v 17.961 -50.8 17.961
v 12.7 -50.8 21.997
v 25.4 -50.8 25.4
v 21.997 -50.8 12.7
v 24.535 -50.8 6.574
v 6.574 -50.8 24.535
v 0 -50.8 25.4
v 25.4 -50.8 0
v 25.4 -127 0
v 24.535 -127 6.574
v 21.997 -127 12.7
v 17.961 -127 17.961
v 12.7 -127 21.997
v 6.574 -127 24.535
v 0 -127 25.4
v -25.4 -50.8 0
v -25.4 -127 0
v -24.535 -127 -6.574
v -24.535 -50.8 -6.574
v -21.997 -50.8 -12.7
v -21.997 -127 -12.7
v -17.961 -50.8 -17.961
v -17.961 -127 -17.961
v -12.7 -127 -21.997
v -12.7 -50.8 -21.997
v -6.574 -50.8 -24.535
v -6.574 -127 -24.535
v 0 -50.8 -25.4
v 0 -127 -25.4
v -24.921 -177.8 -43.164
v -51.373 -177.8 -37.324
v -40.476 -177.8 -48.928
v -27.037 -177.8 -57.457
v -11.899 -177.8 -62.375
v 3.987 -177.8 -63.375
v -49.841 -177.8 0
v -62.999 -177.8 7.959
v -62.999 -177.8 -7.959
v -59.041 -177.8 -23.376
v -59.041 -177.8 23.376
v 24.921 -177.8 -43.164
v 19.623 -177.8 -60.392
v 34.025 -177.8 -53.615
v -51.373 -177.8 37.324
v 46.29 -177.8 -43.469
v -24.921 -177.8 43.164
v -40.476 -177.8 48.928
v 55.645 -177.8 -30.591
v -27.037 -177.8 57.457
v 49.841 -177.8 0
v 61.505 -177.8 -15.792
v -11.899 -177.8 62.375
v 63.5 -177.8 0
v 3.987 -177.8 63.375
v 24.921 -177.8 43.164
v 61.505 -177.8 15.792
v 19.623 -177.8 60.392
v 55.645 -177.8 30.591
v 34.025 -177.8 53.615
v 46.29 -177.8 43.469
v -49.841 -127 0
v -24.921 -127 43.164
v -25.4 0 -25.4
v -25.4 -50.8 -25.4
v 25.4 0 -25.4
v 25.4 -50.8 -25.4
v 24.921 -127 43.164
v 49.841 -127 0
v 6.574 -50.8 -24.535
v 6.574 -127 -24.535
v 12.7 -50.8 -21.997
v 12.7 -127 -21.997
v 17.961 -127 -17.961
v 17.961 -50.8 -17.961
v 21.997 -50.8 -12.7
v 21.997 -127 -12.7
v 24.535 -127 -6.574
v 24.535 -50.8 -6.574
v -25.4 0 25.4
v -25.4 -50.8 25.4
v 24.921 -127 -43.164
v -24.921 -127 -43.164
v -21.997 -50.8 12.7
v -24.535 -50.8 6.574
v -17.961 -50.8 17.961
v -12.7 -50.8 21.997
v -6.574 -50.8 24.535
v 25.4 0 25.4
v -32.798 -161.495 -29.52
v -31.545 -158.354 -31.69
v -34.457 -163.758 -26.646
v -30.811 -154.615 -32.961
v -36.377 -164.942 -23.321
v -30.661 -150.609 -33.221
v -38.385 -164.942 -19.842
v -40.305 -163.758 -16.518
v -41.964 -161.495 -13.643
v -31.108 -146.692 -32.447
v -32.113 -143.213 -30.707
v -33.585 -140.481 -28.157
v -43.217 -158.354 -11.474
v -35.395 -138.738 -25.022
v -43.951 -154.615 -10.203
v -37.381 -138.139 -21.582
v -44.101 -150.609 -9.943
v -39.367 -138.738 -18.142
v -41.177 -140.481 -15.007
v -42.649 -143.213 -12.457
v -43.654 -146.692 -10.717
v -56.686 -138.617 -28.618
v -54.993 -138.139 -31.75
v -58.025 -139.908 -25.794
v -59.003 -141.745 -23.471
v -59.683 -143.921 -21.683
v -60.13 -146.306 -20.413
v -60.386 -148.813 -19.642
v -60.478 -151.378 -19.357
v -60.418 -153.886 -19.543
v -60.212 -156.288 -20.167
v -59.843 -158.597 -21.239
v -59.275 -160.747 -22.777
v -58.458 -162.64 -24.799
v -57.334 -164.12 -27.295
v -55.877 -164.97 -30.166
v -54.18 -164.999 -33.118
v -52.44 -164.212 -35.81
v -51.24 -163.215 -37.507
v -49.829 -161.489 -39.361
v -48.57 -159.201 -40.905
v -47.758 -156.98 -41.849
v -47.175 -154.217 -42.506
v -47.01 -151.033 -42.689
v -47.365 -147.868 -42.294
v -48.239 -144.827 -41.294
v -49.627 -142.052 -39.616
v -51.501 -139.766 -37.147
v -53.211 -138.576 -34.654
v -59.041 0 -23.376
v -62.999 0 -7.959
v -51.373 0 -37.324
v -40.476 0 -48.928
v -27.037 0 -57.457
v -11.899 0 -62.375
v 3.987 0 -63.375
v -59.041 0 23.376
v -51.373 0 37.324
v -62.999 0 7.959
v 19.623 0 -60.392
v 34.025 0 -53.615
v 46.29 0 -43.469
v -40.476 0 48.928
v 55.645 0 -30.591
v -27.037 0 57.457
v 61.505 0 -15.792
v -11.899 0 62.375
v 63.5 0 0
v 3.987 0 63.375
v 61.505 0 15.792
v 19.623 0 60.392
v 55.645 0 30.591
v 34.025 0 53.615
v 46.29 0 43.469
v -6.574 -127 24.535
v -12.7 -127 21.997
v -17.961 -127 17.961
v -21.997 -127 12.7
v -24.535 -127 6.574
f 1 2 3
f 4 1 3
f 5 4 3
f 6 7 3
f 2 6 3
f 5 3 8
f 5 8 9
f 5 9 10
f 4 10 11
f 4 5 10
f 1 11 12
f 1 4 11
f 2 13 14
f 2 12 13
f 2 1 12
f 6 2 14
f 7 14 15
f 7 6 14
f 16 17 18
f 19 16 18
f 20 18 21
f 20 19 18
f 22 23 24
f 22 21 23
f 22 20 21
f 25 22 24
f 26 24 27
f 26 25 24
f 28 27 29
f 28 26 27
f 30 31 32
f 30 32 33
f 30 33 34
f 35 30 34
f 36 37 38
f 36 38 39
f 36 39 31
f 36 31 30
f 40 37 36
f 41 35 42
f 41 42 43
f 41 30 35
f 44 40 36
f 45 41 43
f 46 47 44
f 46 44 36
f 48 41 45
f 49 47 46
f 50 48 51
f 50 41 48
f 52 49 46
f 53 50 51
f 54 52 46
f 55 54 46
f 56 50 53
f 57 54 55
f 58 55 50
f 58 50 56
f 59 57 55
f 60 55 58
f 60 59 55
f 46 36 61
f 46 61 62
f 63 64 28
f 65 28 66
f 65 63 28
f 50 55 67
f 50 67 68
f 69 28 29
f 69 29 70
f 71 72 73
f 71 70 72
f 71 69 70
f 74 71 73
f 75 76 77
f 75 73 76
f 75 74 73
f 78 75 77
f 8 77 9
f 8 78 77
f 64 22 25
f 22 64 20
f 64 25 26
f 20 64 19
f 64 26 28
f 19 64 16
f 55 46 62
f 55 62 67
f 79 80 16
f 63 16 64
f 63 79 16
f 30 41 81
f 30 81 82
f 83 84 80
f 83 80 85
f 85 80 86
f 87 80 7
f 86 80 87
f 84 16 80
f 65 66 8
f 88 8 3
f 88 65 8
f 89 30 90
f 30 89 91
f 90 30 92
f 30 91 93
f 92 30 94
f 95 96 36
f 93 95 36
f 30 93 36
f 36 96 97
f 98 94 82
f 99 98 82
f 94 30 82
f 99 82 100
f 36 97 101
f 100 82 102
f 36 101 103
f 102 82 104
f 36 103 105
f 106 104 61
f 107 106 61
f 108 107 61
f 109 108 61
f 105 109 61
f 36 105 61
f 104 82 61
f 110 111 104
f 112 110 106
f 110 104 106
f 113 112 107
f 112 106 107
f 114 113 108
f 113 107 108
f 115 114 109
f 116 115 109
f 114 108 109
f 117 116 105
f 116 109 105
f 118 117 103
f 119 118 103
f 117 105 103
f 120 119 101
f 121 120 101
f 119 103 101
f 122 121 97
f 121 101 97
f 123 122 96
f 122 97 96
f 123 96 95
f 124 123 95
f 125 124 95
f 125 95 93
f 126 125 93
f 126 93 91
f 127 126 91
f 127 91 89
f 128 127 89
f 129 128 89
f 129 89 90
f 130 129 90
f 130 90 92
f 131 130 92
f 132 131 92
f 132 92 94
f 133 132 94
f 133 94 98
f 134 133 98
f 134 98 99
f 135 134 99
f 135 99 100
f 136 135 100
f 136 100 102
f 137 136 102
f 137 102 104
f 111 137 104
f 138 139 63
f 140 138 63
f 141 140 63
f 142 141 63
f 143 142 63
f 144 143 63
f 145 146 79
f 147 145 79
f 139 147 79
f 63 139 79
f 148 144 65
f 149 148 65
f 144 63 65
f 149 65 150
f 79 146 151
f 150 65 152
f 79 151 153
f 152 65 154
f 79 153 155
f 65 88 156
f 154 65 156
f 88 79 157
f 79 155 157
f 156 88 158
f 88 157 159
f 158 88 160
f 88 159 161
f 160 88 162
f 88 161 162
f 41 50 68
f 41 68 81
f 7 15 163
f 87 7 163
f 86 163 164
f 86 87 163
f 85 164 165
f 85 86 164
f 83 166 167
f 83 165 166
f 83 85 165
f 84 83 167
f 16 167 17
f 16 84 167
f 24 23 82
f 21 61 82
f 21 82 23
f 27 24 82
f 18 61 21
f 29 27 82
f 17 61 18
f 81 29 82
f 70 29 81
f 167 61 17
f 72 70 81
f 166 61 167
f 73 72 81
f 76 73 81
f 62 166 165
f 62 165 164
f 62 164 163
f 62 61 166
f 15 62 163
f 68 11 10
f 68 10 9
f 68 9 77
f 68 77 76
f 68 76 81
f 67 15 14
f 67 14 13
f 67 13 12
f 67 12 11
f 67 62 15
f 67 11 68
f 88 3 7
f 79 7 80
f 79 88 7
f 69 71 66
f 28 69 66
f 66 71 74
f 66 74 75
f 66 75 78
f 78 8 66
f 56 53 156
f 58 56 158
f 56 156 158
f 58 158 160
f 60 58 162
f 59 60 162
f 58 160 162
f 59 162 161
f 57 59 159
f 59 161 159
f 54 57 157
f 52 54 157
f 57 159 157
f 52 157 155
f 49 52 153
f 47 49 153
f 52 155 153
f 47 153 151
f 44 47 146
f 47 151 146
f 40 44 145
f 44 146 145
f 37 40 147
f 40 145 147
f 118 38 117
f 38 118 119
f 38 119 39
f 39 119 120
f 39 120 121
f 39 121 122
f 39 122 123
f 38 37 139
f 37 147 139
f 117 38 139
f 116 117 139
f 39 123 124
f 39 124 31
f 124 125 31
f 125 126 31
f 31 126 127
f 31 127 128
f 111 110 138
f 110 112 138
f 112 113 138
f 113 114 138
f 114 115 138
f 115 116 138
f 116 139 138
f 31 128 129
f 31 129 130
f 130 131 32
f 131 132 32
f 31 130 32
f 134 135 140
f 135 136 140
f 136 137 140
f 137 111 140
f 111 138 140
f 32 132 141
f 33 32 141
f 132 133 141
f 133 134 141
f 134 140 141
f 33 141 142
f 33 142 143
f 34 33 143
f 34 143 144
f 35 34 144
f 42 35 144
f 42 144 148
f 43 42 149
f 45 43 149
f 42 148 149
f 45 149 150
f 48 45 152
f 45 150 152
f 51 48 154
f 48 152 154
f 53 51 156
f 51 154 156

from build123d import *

# Parameters (mm, degrees)
F0_R     = 63.5
F1_DEPTH = 127
F3_DEPTH = 127.001
F4_DEPTH = 50.8
F5_R     = 63.5
F6_DEPTH = 50.8
F7_R     = 13.4769297295
F8_DEPTH = 43.5797324345


with BuildPart() as f1:
    # F0 (on Front) → F1 (new body)
    with BuildSketch(Plane.XZ):
        Circle(F0_R)
    extrude(amount=F1_DEPTH)

    # F2 (on Front) → F3 (cut, through all)
    with BuildSketch(Plane.XZ):
        with BuildLine():
            ThreePointArc((25.4, 0), (17.9605122594, 17.9605122249), (4.89e-08, 25.4))
            ThreePointArc((4.89e-08, 25.4), (-17.9605122127, 17.9605122716), (-25.4, 3.44e-08))
            ThreePointArc((-25.4, 3.44e-08), (-17.9605122437, -17.9605122406), (3.01e-08, -25.4))
            ThreePointArc((3.01e-08, -25.4), (17.9605122528, -17.9605122315), (25.4, 0))
        make_face()
    extrude(amount=F3_DEPTH, mode=Mode.SUBTRACT)

    # F2 (on Front) → F4 (cut)
    with BuildSketch(Plane.XZ):
        with BuildLine():
            Line((4.89e-08, 25.4), (-25.4, 25.4))
            Line((-25.4, 25.4), (-25.4, 3.44e-08))
            ThreePointArc((-25.4, 3.44e-08), (-17.9605122127, 17.9605122716), (4.89e-08, 25.4))
        make_face()
        with BuildLine():
            Line((25.4, 25.4), (4.89e-08, 25.4))
            ThreePointArc((4.89e-08, 25.4), (17.9605122594, 17.9605122249), (25.4, 0))
            Line((25.4, 0), (25.4, 25.4))
        make_face()
        with BuildLine():
            ThreePointArc((25.4, 0), (17.9605122594, 17.9605122249), (4.89e-08, 25.4))
            ThreePointArc((4.89e-08, 25.4), (-17.9605122127, 17.9605122716), (-25.4, 3.44e-08))
            ThreePointArc((-25.4, 3.44e-08), (-17.9605122437, -17.9605122406), (3.01e-08, -25.4))
            ThreePointArc((3.01e-08, -25.4), (17.9605122528, -17.9605122315), (25.4, 0))
        make_face()
        with BuildLine():
            ThreePointArc((3.01e-08, -25.4), (-17.9605122437, -17.9605122406), (-25.4, 3.44e-08))
            Line((-25.4, 3.44e-08), (-25.4, -25.4))
            Line((-25.4, -25.4), (3.01e-08, -25.4))
        make_face()
        with BuildLine():
            Line((25.4, -25.4), (25.4, 0))
            ThreePointArc((25.4, 0), (17.9605122528, -17.9605122315), (3.01e-08, -25.4))
            Line((3.01e-08, -25.4), (25.4, -25.4))
        make_face()
    extrude(amount=F4_DEPTH, mode=Mode.SUBTRACT)

    # F5 (on face) → F6 (join)
    with BuildSketch(Plane.XZ.offset(127)):
        Circle(F5_R)
        Polygon((-49.8413562896, 0), (-24.9206781448, 43.1638807058), (24.9206781448, 43.1638807058), (49.8413562896, 0), (24.9206781448, -43.1638807058), (-24.9206781448, -43.1638807058), align=None, mode=Mode.SUBTRACT)
    extrude(amount=F6_DEPTH)

    # F7 (on face) → F8 (cut, through all)
    with BuildSketch(Plane(origin=(-37.3810172172, 0, -21.5819403529), x_dir=(0, 1, 0), z_dir=(0.8660254038, 0, 0.5))):
        with Locations((-151.6159176826, 0)):
            Circle(F7_R)
    extrude(amount=-F8_DEPTH, mode=Mode.SUBTRACT)


solid = f1.part
